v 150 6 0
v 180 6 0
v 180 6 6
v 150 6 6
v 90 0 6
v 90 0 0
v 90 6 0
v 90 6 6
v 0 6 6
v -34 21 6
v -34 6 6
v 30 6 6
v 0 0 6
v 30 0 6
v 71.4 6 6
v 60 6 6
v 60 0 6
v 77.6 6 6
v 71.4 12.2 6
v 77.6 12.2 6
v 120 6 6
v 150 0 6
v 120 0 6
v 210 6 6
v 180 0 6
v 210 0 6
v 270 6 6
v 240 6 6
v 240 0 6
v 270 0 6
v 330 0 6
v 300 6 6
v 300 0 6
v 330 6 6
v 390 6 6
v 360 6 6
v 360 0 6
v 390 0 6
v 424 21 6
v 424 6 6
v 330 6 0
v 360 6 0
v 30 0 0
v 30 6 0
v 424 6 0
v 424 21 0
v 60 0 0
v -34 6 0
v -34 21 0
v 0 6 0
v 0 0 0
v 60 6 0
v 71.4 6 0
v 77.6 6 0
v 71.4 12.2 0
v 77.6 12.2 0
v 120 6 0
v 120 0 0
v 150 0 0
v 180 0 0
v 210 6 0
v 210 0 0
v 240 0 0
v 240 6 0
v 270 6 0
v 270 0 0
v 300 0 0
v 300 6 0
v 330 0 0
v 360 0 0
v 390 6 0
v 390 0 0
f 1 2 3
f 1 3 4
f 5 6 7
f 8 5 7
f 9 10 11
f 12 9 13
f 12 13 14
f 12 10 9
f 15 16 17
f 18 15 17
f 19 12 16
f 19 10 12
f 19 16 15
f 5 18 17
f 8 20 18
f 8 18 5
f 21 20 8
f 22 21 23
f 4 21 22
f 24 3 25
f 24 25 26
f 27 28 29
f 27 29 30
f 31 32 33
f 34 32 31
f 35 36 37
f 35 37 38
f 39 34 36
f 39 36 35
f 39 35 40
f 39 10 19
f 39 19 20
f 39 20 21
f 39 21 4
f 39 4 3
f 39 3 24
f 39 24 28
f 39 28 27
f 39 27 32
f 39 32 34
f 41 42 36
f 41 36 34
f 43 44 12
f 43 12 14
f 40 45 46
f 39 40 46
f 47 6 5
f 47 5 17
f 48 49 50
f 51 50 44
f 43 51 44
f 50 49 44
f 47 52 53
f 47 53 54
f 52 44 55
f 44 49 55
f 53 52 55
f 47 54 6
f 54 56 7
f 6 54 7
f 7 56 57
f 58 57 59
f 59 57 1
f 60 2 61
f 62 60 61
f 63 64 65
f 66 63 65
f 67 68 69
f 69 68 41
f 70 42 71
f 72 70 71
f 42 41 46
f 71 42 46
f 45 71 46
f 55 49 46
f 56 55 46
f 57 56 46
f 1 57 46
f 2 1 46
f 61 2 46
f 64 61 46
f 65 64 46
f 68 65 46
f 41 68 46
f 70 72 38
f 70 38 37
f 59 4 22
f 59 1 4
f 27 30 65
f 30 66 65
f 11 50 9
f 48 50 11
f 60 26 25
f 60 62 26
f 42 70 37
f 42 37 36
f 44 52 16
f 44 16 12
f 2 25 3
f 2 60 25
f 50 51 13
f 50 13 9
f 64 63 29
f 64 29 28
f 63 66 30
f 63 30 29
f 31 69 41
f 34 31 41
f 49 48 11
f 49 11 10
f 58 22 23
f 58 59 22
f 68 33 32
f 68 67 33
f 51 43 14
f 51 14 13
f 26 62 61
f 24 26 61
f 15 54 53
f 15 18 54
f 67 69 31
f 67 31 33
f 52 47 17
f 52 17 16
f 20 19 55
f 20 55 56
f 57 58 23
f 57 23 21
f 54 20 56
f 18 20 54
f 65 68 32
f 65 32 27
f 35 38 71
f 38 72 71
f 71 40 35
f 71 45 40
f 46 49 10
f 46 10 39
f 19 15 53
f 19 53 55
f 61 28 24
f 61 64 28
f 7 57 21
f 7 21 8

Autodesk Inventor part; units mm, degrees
ref_plane "YZ Plane" through (0, 0, 0) normal (1, 0, 0) x (0, 1, 0)
ref_plane "XZ Plane" through (0, 0, 0) normal (0, 1, 0) x (-1, 0, 0)
ref_plane "XY Plane" through (0, 0, 0) normal (0, 0, 1) x (1, 0, 0)
ref_plane "Work Plane1" through (0, 0, 0) normal (0, 0, 1) x (1, 0, 0)
sketch "Sketch1" plane through (0, 0, 0) normal (0, 0, 1) x (1, 0, 0)
  line L0 (-40, 0) -> (-40, 6)
  line L1 (-40, 6) -> (-34, 6)
  line L2 (0, 6) -> (-34, 6)
  line L3 (0, 6) -> (30, 6)
  line L4 (60, 6) -> (30, 6)
  line L5 (60, 6) -> (90, 6)
  line L6 (120, 6) -> (90, 6)
  line L7 (120, 6) -> (150, 6)
  line L8 (150, 6) -> (150, 0)
  line L9 (150, 0) -> (180, 0)
  line L10 (180, 0) -> (180, 6)
  line L11 (180, 6) -> (150, 6)
  line L12 (180, 6) -> (210, 6)
  line L13 (180, 0) -> (180, 6)
  line L14 (210, 0) -> (180, 0)
  line L15 (210, 0) -> (210, 6)
  line L16 (240, 0) -> (240, 6)
  line L17 (240, 6) -> (210, 6)
  line L18 (210, 6) -> (210, 0)
  line L19 (210, 0) -> (240, 0)
  line L20 (120, 6) -> (150, 6)
  line L21 (120, 0) -> (120, 6)
  line L22 (150, 0) -> (120, 0)
  line L23 (150, 0) -> (150, 6)
  line L24 (60, 6) -> (90, 6)
  line L25 (60, 0) -> (60, 6)
  line L26 (90, 0) -> (60, 0)
  line L27 (90, 0) -> (90, 6)
  line L28 (90, 6) -> (90, 0)
  line L29 (90, 0) -> (120, 0)
  line L30 (120, 0) -> (120, 6)
  line L31 (120, 6) -> (90, 6)
  line L32 (30, 6) -> (30, 0)
  line L33 (30, 0) -> (60, 0)
  line L34 (60, 0) -> (60, 6)
  line L35 (60, 6) -> (30, 6)
  line L36 (-34, 6) -> (-34, 0)
  line L37 (-34, 0) -> (0, 0)
  line L38 (0, 0) -> (0, 6)
  line L39 (0, 6) -> (-34, 6)
  line L40 (240, 0) -> (240, 6)
  line L41 (240, 6) -> (210, 6)
  line L42 (210, 6) -> (210, 0)
  line L43 (210, 0) -> (240, 0)
  line L44 (150, 6) -> (150, 0)
  line L45 (150, 0) -> (180, 0)
  line L46 (180, 0) -> (180, 6)
  line L47 (180, 6) -> (150, 6)
  line L48 (90, 6) -> (90, 0)
  line L49 (90, 0) -> (120, 0)
  line L50 (120, 0) -> (120, 6)
  line L51 (120, 6) -> (90, 6)
  line L52 (240, 6) -> (270, 6)
  line L53 (240, 0) -> (240, 6)
  line L54 (270, 0) -> (240, 0)
  line L55 (270, 0) -> (270, 6)
  line L56 (300, 0) -> (300, 6)
  line L57 (300, 6) -> (270, 6)
  line L58 (270, 6) -> (270, 0)
  line L59 (270, 0) -> (300, 0)
  line L60 (300, 6) -> (330, 6)
  line L61 (300, 0) -> (300, 6)
  line L62 (330, 0) -> (300, 0)
  line L63 (330, 0) -> (330, 6)
  line L64 (360, 0) -> (360, 6)
  line L65 (360, 6) -> (330, 6)
  line L66 (330, 6) -> (330, 0)
  line L67 (330, 0) -> (360, 0)
  line L68 (360, 6) -> (390, 6)
  line L69 (360, 0) -> (360, 6)
  line L70 (390, 0) -> (360, 0)
  line L71 (390, 0) -> (390, 6)
  line L72 (424, 0) -> (424, 6)
  line L73 (424, 6) -> (390, 6)
  line L74 (390, 6) -> (390, 0)
  line L75 (390, 0) -> (424, 0)
  line L76 (424, 6) -> (430, 6)
  line L77 (424, 0) -> (424, 6)
  line L78 (430, 0) -> (424, 0)
  line L79 (430, 6) -> (430, 0)
  line L80 (-40, 6) -> (-40, 21)
  line L81 (-40, 21) -> (430, 21)
  line L82 (430, 21) -> (430, 6)
  line L83 (0, 6) -> (30, 6)
  line L84 (0, 0) -> (0, 6)
  line L85 (30, 0) -> (0, 0)
  line L86 (30, 0) -> (30, 6)
  line L87 (-40, 6) -> (-34, 6)
  line L88 (-40, 0) -> (-40, 6)
  line L89 (-34, 0) -> (-40, 0)
  line L90 (-34, 0) -> (-34, 6)
  line L91 (-34, 6) -> (-34, 21)
  line L92 (424, 6) -> (424, 21)
  dimension "d0" = 15
extrude "Plate1" add sketch "Sketch1" along normal blind 6 contours L91 L81 L92 L73 L68 L65 L60 L57 L52 L17 L12 L11 L7 L6 L5 L4 L3 L2 | L38 L3 L32 L85 | L25 L5 L27 L26 | L71 L70 L64 L68 | L21 L7 L8 L22 | L63 L62 L56 L60 | L10 L12 L15 L14 | L55 L54 L16 L52
sketch "Sketch2" plane through (0, 0, 6) normal (0, 0, 1) x (1, 0, 0)
  line L0 (71.2707, 6) -> (65.2707, 6) projected
  line L1 (83.7293, 6) -> (77.7293, 6) projected
  line L2 (-34, 6) -> (-34, 21) projected
  line L3 (0, 6) -> (-34, 6) projected
  line L4 (0, 0) -> (0, 6) projected
  line L5 (30, 0) -> (0, 0) projected
  line L6 (30, 6) -> (30, 0) projected
  line L7 (60, 6) -> (30, 6) projected
  line L8 (60, 0) -> (60, 6) projected
  line L9 (90, 0) -> (60, 0) projected
  line L10 (90, 6) -> (90, 0) projected
  line L11 (120, 6) -> (90, 6) projected
  line L12 (120, 0) -> (120, 6) projected
  line L13 (150, 0) -> (120, 0) projected
  line L14 (150, 6) -> (150, 0) projected
  line L15 (180, 6) -> (150, 6) projected
  line L16 (180, 0) -> (180, 6) projected
  line L17 (210, 0) -> (180, 0) projected
  line L18 (210, 6) -> (210, 0) projected
  line L19 (240, 6) -> (210, 6) projected
  line L20 (240, 0) -> (240, 6) projected
  line L21 (270, 0) -> (240, 0) projected
  line L22 (270, 6) -> (270, 0) projected
  line L23 (300, 6) -> (270, 6) projected
  line L24 (300, 0) -> (300, 6) projected
  line L25 (330, 0) -> (300, 0) projected
  line L26 (330, 6) -> (330, 0) projected
  line L27 (360, 6) -> (330, 6) projected
  line L28 (360, 0) -> (360, 6) projected
  line L29 (390, 0) -> (360, 0) projected
  line L30 (390, 6) -> (390, 0) projected
  line L31 (424, 6) -> (390, 6) projected
  line L32 (424, 21) -> (424, 6) projected
  line L33 (-34, 21) -> (424, 21) projected
  line L34 (77.6, 6) -> (71.4, 6)
  line L35 (71.4, 6) -> (71.4, 12.2)
  line L36 (71.4, 12.2) -> (77.6, 12.2)
  line L37 (77.6, 12.2) -> (77.6, 6)
  line L38 (71.2707, 6) -> (77.7293, 6) construction
  point P0 (0, 0)
  point P1 (74.5, 6)
  point P2 (74.5, 6)
  dimension "d2" = 6.2
  dimension "d3" = 6.2
extrude "Cut1" cut sketch "Sketch2" against normal blind 6 contours L34 L35 L36 L37
equation "\"d3\" = d2"
equation "\"d4\" = Thickness"
equation "\"d1\" = Thickness"
equation "\"BendRadius\" = Thickness"
equation "\"BendReliefWidth\" = Thickness"
equation "\"BendReliefDepth\" = 0.5 * Thickness"
equation "\"CornerReliefSize\" = 4 * Thickness"
equation "\"MinimumRemnant\" = 2 * Thickness"
equation "\"TransitionRadius\" = BendRadius"
equation "\"JacobiRadiusSize\" = BendRadius"
equation "\"GapSize\" = Thickness"
equation "\"Thickness\" = 6"
properties part number "voorzijde onderkant elektrobox v2" material "Wood (Birch)"
